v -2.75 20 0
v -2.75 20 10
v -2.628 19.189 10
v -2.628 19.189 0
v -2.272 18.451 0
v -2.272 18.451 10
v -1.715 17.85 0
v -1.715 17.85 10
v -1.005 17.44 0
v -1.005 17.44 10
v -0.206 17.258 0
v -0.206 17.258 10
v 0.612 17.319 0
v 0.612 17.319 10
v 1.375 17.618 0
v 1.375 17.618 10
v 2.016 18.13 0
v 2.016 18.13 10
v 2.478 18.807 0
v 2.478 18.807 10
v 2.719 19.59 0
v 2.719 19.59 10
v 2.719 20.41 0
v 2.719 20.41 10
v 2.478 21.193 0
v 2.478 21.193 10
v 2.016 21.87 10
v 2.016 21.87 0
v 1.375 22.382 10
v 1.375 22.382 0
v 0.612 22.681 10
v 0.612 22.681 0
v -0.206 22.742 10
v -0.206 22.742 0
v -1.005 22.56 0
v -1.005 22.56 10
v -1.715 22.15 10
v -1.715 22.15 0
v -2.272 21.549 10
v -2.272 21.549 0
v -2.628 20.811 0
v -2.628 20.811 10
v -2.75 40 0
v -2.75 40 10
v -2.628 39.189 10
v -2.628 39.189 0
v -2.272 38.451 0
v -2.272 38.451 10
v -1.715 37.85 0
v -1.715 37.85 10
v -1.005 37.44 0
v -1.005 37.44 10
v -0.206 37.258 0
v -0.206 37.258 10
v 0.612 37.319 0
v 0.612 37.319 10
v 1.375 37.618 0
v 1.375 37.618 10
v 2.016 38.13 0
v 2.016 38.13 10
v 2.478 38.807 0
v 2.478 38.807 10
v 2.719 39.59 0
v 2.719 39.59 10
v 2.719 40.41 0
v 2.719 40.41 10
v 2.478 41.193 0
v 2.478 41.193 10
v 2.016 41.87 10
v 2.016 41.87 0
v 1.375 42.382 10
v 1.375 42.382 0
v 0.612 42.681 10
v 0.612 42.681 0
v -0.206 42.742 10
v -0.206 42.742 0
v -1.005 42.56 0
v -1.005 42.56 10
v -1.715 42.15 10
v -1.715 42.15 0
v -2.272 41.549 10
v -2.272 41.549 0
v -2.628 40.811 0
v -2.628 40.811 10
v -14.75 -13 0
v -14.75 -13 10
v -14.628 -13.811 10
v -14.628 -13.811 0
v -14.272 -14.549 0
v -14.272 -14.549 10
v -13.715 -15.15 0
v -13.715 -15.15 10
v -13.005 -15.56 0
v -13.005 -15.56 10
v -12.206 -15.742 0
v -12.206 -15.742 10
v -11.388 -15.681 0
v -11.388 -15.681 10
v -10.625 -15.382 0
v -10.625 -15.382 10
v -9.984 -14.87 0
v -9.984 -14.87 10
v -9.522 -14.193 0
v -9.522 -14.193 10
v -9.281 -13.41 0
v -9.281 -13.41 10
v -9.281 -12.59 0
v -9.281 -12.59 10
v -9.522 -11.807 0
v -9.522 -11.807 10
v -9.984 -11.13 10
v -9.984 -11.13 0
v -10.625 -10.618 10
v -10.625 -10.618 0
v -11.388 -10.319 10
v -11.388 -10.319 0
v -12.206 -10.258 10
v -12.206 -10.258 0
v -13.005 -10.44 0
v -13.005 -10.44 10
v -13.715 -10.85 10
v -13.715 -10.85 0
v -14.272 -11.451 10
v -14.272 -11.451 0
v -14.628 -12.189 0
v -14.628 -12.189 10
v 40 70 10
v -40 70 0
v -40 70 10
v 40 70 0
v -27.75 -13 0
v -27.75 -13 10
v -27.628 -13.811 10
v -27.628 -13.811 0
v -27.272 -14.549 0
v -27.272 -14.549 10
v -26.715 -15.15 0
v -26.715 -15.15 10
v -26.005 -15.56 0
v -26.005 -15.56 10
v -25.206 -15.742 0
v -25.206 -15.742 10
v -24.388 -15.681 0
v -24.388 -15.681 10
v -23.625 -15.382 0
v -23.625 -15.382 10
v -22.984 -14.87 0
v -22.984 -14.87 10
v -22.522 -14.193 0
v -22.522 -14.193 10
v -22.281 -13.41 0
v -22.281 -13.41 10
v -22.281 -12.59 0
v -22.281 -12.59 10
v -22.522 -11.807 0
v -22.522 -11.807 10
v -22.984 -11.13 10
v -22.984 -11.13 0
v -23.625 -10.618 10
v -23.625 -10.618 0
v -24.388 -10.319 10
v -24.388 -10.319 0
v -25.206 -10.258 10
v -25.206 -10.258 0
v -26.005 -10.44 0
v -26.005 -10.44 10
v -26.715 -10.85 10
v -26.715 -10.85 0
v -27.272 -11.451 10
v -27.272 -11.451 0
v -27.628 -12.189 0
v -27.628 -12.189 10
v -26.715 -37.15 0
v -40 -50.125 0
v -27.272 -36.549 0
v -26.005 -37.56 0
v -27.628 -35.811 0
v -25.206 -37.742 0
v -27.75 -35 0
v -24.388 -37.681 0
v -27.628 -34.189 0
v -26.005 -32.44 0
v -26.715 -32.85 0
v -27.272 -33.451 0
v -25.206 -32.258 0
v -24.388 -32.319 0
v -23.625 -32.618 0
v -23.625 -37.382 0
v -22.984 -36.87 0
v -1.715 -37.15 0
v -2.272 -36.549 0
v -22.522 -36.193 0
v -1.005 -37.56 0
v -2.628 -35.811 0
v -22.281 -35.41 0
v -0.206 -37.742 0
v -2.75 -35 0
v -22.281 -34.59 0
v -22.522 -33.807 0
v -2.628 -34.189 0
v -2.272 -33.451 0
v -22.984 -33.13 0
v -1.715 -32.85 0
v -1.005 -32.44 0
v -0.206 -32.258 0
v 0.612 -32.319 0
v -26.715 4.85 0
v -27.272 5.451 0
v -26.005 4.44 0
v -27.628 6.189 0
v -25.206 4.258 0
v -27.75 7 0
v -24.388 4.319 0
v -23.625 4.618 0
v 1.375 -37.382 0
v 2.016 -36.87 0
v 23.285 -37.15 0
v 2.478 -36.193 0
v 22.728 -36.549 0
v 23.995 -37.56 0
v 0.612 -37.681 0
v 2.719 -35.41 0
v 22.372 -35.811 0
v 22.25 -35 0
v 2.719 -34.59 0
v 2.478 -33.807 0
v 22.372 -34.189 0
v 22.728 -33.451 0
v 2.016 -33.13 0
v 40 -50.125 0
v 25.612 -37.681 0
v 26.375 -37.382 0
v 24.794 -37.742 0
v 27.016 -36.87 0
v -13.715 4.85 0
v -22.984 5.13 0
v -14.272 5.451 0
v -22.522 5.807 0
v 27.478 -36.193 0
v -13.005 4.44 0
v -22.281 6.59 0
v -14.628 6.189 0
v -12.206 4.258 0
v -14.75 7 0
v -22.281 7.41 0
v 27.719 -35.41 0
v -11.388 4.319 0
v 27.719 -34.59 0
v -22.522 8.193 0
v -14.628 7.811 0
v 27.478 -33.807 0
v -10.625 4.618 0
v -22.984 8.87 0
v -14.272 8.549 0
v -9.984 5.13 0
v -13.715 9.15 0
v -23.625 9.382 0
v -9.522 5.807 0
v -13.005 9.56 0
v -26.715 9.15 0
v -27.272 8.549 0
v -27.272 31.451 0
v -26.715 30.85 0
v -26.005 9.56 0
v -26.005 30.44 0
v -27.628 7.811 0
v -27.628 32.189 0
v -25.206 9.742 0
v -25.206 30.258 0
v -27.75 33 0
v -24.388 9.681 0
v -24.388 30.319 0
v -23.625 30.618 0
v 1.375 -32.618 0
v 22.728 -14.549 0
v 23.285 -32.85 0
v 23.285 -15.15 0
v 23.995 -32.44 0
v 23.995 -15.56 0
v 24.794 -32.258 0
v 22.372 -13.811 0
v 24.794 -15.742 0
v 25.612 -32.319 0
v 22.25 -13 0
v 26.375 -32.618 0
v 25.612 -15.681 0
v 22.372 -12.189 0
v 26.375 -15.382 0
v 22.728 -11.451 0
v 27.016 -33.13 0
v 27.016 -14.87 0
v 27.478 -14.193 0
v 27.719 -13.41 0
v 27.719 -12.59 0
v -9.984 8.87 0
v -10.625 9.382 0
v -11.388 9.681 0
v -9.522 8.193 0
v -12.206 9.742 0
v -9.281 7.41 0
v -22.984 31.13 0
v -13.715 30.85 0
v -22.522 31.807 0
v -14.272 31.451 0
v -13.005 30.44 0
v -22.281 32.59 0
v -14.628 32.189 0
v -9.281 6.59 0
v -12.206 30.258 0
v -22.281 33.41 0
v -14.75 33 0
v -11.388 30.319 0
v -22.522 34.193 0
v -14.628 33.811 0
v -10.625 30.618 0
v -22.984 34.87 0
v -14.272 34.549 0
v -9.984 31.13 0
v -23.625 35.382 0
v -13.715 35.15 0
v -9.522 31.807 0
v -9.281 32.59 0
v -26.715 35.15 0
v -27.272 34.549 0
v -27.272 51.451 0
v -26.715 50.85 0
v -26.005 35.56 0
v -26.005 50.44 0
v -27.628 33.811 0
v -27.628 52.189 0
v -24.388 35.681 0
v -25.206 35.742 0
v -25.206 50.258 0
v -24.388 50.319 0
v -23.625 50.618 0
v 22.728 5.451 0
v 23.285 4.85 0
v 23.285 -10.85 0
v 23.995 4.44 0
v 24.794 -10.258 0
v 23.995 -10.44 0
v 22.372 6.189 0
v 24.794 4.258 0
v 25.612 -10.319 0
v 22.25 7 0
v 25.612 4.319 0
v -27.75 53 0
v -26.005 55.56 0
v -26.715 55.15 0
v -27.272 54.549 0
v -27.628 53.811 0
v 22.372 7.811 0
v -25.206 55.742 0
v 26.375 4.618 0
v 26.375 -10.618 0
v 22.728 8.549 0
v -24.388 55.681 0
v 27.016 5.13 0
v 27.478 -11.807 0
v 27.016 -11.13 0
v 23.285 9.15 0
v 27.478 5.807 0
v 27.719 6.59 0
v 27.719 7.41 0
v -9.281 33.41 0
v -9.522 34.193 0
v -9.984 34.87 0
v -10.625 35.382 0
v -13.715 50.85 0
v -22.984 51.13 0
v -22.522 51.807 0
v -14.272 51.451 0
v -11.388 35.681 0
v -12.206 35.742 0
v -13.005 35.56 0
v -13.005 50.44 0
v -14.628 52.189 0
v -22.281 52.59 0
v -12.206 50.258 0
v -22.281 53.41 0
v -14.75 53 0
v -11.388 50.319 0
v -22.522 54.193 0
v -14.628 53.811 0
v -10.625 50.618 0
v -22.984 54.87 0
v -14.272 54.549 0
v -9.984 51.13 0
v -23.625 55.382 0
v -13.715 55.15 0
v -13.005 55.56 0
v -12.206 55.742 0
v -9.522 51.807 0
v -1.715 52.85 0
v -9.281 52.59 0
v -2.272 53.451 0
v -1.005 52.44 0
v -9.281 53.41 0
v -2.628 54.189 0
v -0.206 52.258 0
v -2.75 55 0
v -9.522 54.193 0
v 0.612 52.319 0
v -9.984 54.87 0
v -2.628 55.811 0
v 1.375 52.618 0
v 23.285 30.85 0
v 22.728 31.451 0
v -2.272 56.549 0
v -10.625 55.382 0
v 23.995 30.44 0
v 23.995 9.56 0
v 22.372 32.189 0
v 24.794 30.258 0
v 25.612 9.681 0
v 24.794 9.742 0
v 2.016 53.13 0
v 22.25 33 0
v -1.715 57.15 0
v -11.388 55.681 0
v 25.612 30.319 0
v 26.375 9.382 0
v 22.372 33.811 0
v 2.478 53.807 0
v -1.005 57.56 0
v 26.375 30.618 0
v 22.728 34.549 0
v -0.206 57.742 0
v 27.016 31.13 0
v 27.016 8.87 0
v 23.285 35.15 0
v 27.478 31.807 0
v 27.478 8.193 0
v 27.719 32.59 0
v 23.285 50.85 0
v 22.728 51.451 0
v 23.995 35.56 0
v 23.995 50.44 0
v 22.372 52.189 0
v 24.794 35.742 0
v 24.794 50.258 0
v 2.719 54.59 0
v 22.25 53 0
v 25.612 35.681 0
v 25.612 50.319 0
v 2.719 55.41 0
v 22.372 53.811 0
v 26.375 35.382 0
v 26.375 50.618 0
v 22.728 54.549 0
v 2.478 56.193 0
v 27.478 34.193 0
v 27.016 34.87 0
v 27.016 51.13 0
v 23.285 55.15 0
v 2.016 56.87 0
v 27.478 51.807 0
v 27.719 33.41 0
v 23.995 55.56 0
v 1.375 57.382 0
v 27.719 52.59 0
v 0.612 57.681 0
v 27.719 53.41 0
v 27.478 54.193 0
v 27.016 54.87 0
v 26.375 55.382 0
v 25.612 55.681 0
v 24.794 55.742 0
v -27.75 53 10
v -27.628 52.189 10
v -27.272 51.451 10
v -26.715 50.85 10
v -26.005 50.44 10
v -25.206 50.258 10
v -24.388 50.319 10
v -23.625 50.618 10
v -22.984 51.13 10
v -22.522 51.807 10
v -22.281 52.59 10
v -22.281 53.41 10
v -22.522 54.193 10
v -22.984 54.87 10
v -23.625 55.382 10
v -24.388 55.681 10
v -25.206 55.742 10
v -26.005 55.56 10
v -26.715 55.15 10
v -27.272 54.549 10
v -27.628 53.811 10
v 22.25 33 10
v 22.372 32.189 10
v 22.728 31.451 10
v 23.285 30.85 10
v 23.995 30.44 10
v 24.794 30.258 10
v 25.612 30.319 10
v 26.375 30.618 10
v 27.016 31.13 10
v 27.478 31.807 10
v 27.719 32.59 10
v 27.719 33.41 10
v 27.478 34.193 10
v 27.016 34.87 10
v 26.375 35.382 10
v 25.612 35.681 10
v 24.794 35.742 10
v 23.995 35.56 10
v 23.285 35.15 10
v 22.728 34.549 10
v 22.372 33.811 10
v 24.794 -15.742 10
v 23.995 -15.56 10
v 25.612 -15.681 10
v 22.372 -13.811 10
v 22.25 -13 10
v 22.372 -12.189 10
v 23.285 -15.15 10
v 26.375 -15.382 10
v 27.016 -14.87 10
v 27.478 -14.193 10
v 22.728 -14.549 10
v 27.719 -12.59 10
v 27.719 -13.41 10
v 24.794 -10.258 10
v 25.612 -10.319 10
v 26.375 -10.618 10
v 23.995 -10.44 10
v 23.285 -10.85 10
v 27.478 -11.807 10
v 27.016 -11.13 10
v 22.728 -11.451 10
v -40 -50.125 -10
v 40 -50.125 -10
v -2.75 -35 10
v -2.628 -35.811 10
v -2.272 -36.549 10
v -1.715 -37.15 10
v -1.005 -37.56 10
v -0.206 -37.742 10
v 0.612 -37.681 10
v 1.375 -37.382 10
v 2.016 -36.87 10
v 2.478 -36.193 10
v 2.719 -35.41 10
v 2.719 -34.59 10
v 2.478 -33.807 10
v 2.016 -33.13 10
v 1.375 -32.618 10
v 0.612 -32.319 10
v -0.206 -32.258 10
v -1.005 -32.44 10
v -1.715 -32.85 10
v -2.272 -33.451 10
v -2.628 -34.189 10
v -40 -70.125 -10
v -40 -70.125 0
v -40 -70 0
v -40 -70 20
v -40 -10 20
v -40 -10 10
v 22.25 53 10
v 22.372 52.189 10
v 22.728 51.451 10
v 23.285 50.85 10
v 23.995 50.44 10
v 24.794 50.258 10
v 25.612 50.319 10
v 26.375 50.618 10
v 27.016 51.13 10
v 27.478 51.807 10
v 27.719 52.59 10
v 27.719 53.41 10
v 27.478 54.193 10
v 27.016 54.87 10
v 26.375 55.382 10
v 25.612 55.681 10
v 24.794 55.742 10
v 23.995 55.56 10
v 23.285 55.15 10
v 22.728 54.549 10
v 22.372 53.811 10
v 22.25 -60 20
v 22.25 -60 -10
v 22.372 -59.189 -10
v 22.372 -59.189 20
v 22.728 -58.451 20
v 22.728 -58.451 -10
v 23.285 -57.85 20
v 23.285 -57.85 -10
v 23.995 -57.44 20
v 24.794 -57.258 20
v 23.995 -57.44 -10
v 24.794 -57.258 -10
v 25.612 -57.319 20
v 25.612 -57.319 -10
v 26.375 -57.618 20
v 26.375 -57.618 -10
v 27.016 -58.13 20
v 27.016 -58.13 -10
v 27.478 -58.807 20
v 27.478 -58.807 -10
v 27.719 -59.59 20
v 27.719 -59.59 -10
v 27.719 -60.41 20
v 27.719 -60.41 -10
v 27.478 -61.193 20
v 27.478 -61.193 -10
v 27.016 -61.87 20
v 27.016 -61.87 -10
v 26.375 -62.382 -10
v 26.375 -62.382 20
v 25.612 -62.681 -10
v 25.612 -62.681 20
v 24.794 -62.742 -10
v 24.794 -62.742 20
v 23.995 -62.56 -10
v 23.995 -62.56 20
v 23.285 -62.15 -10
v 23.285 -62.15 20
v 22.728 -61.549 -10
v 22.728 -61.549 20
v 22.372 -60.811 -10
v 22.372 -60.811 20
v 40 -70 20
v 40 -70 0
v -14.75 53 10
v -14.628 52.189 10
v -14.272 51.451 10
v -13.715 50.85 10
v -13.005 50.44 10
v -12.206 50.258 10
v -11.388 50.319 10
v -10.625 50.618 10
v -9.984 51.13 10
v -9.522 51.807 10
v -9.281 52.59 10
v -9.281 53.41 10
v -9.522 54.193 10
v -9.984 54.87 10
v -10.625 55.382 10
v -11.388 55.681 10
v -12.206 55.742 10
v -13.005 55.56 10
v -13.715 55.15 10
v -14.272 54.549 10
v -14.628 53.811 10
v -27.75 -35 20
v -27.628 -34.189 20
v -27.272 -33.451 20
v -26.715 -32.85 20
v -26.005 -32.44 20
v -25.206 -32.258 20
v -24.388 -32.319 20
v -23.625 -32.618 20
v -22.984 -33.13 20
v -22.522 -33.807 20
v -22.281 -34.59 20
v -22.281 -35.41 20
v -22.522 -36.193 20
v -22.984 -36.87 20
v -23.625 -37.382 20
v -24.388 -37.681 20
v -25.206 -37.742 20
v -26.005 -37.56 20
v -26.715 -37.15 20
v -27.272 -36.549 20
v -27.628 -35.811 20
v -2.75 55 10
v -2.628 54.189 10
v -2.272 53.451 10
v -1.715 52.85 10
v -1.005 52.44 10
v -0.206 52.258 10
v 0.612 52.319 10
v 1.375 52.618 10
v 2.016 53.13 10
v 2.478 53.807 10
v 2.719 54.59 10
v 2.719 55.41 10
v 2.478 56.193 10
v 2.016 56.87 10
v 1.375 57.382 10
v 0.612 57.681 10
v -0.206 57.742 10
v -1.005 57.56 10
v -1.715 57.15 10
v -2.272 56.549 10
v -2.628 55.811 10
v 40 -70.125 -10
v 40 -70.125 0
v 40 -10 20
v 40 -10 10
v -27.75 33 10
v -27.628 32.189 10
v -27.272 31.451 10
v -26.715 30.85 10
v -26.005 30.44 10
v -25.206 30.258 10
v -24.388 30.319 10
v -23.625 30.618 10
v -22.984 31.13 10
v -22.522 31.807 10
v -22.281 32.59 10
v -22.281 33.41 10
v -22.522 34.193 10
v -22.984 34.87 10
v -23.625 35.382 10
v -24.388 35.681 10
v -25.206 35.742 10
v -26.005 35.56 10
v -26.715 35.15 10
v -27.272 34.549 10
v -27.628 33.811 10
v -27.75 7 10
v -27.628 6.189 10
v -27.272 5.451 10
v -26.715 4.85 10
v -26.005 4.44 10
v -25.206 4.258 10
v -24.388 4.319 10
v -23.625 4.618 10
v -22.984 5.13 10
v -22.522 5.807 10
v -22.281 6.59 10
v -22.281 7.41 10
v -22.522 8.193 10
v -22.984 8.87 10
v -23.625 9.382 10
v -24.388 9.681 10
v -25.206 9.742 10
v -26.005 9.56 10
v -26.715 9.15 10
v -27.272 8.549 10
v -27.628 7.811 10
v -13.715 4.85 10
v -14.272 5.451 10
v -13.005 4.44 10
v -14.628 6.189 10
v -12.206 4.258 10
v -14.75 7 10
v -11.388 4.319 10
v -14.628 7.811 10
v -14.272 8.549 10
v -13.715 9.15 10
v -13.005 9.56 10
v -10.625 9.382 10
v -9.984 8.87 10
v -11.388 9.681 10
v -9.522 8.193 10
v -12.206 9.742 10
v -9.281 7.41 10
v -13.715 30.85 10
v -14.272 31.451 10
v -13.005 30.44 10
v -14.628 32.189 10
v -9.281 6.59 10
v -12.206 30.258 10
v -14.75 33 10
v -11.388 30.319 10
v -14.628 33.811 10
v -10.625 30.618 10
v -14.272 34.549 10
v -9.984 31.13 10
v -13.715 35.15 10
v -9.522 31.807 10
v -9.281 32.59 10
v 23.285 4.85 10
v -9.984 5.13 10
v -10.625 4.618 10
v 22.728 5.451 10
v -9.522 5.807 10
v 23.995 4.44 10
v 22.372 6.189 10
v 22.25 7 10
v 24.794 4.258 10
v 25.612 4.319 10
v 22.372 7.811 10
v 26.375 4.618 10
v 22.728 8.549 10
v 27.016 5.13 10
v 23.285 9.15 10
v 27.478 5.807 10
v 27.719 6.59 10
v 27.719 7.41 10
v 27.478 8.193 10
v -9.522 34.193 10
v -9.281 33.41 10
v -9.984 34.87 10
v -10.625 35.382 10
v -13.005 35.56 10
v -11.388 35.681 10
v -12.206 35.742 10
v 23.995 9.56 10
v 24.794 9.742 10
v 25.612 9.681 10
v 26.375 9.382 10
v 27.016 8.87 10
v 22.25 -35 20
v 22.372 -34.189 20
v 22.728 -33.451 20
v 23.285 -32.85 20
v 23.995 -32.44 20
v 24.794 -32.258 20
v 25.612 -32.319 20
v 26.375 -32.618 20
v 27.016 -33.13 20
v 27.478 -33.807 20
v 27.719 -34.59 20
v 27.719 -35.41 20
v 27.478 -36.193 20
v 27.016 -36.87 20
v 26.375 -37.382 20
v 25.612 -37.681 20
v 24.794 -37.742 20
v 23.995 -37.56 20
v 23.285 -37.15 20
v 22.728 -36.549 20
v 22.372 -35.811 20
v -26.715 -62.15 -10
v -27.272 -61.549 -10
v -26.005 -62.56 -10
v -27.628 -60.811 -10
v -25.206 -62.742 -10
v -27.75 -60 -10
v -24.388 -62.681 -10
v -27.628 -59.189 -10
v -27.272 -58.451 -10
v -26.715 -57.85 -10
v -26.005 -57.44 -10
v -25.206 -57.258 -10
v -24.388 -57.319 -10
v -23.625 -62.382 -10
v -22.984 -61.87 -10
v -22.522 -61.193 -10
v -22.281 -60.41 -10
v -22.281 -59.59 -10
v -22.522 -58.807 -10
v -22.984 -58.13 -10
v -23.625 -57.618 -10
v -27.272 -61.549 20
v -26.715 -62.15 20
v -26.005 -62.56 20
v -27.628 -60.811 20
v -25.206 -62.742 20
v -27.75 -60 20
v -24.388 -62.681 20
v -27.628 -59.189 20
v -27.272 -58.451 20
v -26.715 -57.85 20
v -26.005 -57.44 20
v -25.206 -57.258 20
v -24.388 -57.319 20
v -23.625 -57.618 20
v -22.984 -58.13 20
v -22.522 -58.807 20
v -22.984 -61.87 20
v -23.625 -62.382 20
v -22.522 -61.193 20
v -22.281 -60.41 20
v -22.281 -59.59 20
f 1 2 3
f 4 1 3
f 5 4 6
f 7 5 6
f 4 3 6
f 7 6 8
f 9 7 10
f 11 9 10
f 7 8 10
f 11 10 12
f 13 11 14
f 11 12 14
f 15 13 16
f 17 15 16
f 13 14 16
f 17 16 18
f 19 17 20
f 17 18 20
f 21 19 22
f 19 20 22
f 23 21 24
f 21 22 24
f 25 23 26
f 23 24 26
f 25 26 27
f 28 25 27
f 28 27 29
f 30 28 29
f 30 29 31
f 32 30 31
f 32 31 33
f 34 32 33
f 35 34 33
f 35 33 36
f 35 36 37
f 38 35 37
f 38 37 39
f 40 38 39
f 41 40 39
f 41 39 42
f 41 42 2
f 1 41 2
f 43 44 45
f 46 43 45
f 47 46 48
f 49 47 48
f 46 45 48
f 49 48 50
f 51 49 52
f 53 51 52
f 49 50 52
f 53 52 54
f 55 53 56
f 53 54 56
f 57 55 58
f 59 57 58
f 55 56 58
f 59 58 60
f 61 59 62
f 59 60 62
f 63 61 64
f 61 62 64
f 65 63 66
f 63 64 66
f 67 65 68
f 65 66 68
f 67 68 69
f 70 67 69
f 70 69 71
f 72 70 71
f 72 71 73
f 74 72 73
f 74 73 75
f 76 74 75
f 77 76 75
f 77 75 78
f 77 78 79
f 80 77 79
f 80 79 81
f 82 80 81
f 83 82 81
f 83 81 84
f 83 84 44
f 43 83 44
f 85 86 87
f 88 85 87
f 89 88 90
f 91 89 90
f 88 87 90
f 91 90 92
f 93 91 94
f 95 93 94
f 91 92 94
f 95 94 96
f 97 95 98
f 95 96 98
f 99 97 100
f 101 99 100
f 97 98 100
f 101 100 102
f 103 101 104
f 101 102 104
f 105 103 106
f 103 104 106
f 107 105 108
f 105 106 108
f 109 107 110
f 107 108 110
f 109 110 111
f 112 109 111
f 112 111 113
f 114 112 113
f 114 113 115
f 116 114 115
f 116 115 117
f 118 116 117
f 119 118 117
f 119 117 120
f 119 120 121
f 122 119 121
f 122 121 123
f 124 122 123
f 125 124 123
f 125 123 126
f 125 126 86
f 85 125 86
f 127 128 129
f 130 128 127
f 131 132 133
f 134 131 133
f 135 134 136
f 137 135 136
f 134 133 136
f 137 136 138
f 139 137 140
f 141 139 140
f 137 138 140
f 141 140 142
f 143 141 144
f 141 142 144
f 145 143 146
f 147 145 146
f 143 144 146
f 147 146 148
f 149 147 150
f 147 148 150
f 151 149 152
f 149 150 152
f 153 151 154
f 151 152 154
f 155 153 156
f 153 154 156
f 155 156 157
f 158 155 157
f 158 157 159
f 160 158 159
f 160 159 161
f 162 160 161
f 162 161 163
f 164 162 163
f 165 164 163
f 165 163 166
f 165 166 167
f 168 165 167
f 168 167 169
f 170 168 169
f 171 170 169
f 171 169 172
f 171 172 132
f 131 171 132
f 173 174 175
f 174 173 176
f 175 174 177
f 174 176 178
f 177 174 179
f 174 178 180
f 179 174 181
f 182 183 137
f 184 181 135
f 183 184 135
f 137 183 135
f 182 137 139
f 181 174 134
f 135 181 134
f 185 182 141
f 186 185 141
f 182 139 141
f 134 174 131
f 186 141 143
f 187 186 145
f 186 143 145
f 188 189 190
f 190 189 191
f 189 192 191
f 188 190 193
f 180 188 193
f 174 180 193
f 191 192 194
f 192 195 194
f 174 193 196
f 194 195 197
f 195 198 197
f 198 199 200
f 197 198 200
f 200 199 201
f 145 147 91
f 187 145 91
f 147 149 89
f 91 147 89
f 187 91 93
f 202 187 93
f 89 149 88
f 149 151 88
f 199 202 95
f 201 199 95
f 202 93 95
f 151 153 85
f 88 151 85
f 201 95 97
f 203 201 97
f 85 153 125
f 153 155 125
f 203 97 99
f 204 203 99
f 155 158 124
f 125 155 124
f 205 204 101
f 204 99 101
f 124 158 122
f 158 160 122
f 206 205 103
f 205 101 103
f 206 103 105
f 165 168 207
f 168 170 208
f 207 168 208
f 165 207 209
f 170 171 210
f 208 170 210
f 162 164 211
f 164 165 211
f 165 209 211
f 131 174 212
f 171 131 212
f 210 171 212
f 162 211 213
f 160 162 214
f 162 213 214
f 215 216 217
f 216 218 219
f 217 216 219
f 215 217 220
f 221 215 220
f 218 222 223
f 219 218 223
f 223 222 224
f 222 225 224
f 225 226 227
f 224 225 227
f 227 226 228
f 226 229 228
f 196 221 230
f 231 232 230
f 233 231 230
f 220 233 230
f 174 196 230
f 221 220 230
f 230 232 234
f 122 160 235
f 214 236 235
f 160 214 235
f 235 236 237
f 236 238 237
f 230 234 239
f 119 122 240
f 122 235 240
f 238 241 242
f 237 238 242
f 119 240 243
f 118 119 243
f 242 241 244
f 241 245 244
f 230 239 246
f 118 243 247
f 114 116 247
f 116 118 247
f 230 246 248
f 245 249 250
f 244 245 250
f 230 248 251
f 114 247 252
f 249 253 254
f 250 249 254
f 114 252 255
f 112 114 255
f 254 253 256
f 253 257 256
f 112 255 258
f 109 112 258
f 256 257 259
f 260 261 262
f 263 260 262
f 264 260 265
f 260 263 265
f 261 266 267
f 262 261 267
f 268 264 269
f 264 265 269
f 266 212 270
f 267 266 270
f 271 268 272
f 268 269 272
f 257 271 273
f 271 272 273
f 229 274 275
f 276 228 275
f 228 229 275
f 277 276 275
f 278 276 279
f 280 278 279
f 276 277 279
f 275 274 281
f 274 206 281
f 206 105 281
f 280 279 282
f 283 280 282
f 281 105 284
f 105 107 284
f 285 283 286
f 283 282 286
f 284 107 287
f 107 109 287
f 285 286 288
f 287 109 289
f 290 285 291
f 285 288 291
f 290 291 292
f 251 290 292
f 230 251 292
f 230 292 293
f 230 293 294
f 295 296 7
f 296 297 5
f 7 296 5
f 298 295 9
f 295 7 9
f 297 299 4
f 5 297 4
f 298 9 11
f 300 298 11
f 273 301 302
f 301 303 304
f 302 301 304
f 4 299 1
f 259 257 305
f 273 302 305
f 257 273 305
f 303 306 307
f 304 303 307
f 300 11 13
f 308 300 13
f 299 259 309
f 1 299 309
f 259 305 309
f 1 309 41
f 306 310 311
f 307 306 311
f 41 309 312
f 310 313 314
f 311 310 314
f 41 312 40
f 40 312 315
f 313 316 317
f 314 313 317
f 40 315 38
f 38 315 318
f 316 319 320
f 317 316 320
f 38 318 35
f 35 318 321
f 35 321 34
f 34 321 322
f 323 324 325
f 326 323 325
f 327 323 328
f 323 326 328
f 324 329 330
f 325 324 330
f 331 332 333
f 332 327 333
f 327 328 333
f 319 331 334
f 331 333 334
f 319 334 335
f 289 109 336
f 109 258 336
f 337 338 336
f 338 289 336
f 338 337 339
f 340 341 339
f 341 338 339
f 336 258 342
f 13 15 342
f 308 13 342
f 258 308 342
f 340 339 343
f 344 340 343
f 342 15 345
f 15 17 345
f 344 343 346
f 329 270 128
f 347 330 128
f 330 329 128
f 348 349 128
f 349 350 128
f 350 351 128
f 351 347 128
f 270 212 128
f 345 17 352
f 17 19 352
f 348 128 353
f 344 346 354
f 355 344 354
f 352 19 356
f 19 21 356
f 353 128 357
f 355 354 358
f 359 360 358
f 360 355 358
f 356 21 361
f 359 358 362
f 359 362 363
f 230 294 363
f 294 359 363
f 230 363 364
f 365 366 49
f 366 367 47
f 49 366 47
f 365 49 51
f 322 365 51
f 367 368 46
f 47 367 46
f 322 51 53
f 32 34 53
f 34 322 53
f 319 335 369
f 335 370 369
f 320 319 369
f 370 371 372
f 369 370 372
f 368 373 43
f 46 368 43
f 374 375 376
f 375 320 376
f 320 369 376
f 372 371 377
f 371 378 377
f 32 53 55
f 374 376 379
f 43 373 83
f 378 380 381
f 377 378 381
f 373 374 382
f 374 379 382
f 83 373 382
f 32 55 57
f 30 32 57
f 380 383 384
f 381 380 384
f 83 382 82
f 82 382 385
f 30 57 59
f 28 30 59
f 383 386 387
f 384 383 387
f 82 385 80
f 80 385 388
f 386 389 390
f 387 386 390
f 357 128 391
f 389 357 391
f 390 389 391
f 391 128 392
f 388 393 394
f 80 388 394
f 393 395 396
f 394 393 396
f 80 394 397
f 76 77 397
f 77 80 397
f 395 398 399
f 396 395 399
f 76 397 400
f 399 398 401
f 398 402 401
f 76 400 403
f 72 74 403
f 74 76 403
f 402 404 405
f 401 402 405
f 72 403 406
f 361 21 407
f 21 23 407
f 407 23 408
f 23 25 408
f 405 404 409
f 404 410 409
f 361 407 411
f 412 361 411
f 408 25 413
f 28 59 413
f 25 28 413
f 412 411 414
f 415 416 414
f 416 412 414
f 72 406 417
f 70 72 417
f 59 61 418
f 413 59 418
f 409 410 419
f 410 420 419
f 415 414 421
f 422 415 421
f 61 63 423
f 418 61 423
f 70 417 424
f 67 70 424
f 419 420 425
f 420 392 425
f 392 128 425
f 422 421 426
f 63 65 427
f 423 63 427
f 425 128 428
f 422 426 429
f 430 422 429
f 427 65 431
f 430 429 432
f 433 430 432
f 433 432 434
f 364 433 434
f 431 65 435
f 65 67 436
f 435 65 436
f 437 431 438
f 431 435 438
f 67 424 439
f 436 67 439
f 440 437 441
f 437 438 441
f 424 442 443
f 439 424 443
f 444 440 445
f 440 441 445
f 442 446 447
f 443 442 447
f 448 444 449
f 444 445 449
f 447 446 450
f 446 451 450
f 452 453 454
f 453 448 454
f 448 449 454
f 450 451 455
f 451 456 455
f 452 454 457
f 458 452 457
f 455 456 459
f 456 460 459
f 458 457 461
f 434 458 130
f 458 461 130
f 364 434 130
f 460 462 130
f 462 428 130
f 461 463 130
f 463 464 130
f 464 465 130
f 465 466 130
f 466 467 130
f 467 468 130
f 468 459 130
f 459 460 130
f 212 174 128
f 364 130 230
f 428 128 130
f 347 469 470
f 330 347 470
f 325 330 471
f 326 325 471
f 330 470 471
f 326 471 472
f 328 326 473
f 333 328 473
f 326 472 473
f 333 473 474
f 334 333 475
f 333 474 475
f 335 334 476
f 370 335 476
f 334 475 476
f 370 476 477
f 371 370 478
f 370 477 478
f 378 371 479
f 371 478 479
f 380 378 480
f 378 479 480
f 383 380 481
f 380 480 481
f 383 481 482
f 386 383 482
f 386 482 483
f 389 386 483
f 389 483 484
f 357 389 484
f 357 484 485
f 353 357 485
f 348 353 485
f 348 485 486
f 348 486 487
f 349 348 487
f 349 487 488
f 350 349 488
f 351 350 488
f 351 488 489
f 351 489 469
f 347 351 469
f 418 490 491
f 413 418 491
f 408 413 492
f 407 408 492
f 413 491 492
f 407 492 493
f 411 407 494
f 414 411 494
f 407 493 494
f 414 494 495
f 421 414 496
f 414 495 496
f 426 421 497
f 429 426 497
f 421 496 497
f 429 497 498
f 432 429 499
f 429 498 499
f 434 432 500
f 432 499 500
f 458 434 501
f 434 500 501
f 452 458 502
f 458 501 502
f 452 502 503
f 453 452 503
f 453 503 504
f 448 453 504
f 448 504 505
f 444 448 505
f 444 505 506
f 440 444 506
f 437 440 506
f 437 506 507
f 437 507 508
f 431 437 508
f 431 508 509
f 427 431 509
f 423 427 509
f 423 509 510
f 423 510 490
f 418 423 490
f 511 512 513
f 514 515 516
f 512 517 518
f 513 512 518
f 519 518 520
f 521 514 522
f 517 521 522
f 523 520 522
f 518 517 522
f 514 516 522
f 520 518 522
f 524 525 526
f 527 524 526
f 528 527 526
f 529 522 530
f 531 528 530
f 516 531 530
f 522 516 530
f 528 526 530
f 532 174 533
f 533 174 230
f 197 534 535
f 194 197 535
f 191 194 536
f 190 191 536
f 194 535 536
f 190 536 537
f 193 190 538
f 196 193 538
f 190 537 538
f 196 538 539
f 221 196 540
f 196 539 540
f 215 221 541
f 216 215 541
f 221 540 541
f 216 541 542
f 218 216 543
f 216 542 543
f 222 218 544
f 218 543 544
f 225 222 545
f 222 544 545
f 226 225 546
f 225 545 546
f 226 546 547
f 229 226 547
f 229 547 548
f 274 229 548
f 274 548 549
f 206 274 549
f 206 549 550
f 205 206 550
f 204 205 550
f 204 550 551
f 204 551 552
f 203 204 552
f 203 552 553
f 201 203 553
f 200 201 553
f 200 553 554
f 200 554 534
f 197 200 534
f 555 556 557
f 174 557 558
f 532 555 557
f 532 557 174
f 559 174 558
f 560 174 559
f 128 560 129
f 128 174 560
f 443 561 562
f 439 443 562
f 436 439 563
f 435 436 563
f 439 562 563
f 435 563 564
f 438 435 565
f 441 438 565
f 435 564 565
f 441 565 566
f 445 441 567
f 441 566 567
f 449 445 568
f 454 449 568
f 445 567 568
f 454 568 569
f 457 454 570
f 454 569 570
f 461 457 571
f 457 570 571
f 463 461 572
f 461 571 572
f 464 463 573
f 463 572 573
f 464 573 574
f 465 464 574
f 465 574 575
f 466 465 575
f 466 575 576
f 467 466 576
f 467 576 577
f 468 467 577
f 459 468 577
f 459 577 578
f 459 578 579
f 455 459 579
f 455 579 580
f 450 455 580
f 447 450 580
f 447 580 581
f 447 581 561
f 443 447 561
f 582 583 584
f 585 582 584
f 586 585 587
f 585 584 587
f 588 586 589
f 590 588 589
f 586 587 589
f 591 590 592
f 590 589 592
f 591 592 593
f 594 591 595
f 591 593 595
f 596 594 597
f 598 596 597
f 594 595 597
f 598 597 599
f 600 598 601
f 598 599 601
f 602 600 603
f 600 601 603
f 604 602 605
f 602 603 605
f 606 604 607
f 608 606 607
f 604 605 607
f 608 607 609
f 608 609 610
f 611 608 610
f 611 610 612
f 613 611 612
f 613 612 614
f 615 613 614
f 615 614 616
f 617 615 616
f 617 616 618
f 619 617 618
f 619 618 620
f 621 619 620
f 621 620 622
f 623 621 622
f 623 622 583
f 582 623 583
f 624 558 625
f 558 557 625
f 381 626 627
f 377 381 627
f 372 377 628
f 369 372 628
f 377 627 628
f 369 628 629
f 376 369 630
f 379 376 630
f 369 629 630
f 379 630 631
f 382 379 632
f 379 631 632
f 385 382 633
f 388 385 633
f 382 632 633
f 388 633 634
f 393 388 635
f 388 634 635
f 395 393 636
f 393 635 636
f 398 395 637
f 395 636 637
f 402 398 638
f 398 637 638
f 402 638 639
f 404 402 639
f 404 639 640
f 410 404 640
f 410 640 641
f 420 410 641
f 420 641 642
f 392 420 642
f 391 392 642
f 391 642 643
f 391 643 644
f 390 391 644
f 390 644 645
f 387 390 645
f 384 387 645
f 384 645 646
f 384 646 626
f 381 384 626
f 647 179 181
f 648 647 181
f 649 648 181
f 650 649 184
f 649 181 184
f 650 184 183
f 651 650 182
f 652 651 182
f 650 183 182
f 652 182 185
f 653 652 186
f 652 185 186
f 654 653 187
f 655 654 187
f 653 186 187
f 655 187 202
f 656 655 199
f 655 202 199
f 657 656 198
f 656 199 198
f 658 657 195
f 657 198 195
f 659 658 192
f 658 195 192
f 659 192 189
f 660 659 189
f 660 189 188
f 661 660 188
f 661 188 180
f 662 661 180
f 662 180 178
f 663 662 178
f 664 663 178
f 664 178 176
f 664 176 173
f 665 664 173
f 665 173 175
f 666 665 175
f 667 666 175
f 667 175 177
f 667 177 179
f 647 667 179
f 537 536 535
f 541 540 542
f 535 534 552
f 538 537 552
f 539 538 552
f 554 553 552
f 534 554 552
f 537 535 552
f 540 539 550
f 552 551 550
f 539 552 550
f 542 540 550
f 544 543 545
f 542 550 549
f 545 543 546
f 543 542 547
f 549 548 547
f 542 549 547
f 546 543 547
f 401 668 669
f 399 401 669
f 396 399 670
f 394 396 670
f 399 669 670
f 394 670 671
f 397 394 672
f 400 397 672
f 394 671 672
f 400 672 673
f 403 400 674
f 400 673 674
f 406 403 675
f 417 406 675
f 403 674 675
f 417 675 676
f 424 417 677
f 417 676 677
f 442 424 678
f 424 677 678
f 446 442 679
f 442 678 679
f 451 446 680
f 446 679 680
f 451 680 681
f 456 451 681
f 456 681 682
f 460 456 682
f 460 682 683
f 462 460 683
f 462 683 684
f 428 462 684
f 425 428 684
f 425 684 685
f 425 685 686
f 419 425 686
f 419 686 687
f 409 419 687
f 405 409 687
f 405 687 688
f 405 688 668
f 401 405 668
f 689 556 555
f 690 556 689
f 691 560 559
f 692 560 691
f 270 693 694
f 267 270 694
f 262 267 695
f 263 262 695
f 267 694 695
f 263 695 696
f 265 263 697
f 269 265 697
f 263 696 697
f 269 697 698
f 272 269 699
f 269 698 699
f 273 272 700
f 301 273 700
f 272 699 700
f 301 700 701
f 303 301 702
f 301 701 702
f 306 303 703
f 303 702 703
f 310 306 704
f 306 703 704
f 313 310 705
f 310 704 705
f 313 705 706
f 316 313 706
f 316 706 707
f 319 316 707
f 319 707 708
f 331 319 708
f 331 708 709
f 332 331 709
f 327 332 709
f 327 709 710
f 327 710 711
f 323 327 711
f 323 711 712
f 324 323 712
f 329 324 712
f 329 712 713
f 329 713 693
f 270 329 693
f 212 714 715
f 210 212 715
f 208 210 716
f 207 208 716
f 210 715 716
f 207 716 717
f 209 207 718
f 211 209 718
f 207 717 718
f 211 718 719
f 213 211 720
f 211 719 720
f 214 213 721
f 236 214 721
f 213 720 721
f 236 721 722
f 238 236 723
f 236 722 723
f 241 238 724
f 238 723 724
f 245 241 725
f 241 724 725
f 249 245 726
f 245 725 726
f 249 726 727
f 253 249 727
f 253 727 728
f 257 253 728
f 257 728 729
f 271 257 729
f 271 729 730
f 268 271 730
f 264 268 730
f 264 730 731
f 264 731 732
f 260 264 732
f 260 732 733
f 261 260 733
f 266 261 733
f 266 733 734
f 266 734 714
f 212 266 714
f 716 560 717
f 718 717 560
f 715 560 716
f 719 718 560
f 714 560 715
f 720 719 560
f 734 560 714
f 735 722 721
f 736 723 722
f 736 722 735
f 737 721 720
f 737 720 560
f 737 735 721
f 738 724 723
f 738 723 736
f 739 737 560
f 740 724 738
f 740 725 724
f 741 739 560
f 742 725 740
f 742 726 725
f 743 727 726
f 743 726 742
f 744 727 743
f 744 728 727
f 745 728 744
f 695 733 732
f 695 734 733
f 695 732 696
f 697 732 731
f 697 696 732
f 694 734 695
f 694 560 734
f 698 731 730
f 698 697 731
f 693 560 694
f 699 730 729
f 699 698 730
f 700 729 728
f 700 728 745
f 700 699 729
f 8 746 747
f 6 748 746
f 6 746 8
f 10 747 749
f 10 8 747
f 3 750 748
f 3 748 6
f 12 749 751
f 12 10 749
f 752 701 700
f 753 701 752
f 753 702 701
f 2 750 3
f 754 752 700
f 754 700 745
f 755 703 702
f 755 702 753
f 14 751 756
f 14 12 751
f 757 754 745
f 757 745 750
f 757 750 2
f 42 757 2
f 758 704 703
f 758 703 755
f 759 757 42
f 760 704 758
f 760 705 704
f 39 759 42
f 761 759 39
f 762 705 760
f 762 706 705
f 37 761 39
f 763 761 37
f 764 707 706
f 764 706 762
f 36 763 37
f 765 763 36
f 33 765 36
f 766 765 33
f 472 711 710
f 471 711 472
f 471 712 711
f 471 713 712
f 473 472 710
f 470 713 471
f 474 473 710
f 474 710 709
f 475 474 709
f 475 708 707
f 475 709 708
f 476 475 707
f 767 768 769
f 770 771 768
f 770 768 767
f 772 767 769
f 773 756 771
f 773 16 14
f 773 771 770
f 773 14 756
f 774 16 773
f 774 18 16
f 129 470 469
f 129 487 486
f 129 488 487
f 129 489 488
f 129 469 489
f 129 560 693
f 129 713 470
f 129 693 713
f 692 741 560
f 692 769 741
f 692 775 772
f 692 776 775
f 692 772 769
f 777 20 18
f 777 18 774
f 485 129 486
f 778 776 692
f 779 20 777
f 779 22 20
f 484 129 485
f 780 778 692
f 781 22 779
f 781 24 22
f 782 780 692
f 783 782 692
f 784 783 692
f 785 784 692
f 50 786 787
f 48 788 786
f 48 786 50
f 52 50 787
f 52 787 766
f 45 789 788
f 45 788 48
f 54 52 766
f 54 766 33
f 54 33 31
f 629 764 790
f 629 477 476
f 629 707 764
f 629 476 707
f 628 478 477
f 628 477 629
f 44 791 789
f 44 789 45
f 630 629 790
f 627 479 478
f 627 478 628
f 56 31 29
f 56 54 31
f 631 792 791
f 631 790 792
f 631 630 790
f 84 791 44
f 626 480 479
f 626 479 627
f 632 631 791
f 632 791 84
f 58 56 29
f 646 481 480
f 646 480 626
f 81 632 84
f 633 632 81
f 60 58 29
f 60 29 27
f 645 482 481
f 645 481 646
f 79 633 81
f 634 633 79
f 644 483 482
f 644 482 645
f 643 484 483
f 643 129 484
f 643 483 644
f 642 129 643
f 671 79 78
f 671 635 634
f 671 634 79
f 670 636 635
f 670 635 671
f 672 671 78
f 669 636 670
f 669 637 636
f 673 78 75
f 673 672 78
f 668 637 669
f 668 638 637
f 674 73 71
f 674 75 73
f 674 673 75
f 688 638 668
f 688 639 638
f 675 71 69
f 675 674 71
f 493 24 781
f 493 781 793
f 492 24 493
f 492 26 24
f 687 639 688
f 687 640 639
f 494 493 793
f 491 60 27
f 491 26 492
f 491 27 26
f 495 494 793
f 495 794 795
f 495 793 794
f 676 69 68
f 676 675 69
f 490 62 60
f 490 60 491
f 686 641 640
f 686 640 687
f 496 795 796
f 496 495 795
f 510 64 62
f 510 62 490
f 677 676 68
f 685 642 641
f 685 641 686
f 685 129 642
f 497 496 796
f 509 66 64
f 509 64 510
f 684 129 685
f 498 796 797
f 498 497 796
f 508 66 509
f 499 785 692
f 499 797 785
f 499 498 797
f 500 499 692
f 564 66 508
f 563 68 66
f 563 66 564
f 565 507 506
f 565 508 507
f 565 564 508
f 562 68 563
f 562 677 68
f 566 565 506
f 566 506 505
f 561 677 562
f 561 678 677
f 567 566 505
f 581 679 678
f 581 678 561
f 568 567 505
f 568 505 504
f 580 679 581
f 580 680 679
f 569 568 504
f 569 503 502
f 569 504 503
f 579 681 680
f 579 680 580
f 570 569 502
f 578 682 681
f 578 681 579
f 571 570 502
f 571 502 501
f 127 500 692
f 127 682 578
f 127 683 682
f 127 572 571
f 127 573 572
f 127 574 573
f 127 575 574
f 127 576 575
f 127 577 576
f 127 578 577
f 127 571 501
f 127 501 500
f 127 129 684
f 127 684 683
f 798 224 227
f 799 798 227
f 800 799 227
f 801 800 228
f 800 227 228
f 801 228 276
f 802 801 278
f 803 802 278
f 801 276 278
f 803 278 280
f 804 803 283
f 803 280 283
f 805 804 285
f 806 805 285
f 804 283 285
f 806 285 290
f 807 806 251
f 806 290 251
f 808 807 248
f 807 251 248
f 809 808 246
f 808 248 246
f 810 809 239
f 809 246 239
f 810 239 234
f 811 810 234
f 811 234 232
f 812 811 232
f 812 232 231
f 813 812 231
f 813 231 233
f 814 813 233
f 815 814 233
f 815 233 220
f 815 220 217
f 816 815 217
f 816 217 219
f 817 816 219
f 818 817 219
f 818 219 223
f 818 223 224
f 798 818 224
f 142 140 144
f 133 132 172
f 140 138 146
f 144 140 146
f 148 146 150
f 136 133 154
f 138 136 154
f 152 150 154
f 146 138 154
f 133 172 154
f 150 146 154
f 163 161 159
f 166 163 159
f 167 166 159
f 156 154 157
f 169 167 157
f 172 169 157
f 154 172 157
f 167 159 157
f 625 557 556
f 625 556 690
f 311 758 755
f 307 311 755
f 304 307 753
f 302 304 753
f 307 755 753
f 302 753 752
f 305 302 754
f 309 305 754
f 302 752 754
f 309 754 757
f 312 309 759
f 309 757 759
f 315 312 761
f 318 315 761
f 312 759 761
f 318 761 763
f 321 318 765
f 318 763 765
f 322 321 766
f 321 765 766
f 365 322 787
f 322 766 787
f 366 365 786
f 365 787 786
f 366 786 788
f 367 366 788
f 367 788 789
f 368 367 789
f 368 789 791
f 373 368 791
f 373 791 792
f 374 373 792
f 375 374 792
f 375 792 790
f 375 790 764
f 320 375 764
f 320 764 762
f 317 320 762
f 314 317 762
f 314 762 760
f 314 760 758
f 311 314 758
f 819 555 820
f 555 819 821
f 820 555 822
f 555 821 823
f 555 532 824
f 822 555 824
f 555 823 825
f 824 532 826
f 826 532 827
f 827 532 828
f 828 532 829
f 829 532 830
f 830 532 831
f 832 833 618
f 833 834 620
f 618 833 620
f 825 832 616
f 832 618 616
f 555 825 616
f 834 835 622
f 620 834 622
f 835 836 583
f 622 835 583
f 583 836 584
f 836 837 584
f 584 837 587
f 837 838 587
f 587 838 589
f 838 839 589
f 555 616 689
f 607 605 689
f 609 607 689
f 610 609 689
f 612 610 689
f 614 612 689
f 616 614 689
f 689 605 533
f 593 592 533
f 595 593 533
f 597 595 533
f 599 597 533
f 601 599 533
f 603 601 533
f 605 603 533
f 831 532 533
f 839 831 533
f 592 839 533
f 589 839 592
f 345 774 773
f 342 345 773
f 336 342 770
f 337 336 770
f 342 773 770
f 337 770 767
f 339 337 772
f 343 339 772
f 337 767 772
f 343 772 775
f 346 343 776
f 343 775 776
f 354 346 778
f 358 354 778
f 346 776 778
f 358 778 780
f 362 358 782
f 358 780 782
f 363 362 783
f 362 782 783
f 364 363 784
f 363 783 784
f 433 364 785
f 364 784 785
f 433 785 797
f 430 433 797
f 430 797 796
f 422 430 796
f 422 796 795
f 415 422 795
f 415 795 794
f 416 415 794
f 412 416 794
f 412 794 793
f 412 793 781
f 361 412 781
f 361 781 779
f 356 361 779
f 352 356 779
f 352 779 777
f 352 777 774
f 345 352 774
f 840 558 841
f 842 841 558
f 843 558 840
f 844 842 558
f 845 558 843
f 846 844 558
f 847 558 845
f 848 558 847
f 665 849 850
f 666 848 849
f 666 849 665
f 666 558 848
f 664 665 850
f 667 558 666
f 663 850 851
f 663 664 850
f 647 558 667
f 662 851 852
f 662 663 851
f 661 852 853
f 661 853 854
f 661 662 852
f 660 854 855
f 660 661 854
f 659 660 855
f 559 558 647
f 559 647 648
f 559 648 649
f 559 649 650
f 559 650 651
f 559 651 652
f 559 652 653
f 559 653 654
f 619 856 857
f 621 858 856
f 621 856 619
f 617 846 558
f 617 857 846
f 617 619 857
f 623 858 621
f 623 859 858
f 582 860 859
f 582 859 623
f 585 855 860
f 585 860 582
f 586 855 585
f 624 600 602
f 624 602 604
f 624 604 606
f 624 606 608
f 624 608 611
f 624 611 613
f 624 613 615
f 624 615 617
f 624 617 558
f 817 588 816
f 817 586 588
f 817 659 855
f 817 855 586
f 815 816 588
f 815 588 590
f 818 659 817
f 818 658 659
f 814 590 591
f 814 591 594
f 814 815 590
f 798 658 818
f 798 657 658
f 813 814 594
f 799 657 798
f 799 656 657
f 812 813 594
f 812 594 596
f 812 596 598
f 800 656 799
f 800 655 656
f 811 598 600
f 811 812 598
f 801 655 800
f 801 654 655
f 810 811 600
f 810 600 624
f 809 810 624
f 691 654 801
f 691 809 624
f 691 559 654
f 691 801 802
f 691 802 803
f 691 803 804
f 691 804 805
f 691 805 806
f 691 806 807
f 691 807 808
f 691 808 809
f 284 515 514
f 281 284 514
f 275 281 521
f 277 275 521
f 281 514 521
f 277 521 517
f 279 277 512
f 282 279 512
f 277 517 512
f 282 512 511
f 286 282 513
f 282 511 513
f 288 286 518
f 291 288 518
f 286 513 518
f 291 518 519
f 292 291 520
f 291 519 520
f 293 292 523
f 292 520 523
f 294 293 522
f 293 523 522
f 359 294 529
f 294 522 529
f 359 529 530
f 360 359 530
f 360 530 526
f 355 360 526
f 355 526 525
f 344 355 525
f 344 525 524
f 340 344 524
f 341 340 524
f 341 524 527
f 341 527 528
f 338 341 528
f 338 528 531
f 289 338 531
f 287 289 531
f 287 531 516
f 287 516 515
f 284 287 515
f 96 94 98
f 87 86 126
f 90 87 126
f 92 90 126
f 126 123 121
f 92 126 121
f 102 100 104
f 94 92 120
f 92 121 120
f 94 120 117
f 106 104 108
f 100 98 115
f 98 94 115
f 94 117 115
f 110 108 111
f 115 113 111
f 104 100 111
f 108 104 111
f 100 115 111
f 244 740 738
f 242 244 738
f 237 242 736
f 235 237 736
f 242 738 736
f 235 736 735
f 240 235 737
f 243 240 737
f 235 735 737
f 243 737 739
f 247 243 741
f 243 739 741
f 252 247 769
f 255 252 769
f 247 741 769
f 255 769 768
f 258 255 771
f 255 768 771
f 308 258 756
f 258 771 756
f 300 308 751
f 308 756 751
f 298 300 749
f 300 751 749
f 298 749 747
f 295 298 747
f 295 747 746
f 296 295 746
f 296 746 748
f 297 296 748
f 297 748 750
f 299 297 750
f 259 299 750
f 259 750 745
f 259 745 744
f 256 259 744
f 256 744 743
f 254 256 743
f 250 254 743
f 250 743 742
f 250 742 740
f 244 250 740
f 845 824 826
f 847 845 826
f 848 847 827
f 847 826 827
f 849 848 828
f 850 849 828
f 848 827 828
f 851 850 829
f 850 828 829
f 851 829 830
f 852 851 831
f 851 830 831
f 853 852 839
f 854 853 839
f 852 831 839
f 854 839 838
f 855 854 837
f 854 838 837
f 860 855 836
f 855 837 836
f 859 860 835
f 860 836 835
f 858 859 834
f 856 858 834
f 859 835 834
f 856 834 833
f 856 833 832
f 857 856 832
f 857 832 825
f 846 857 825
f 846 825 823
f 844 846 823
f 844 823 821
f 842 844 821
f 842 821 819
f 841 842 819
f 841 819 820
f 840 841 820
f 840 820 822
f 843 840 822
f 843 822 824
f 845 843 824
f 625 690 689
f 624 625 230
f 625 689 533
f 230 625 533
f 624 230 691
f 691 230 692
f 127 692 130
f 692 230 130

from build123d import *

# Parameters (mm, degrees)
F0_W     = 80
F0_H     = 140
F1_DEPTH = 10
F2_D     = 5.5
F3_D     = 5.5
F4_W     = 80
F4_H     = 20
F5_DEPTH = 10
F6_W     = 80
F6_H     = 60
F7_DEPTH = 10
F9_D     = 5.5


with BuildPart() as f1:
    # F0 (on Top) → F1 (new body)
    with BuildSketch(Plane.XY):
        Rectangle(F0_W, F0_H)
    extrude(amount=F1_DEPTH)

    # F2 (through all)
    with Locations(Plane(origin=(0, 0, 0), x_dir=(1, 0, 0), z_dir=(0, 0, -1))):
        with Locations((25, -7), (25, 13), (25, -33), (25, -53), (-12, -53), (-12, -33), (-25, -33), (-25, -53), (-12, -7), (-25, -7), (-12, 13), (-25, 13)):
            Hole(F2_D / 2)

    # F3 (through all)
    with Locations(Plane(origin=(0, 0, 0), x_dir=(1, 0, 0), z_dir=(0, 0, -1))):
        with Locations((0, -40), (0, -55), (0, 35), (0, -20)):
            Hole(F3_D / 2)

    # F4 (on face) → F5 (join)
    with BuildSketch(Plane.XY):
        with Locations((0, -60.125451535)):
            Rectangle(F4_W, F4_H)
    extrude(amount=-F5_DEPTH)

    # F6 (on face) → F7 (join)
    with BuildSketch(Plane.XY.offset(10)):
        with Locations((0, -40)):
            Rectangle(F6_W, F6_H)
    extrude(amount=F7_DEPTH)

    # F9 (through all)
    with Locations(Plane.XY.offset(20)):
        with Locations((-25, -35), (25, -35), (-25, -60), (25, -60)):
            Hole(F9_D / 2)


solid = f1.part
